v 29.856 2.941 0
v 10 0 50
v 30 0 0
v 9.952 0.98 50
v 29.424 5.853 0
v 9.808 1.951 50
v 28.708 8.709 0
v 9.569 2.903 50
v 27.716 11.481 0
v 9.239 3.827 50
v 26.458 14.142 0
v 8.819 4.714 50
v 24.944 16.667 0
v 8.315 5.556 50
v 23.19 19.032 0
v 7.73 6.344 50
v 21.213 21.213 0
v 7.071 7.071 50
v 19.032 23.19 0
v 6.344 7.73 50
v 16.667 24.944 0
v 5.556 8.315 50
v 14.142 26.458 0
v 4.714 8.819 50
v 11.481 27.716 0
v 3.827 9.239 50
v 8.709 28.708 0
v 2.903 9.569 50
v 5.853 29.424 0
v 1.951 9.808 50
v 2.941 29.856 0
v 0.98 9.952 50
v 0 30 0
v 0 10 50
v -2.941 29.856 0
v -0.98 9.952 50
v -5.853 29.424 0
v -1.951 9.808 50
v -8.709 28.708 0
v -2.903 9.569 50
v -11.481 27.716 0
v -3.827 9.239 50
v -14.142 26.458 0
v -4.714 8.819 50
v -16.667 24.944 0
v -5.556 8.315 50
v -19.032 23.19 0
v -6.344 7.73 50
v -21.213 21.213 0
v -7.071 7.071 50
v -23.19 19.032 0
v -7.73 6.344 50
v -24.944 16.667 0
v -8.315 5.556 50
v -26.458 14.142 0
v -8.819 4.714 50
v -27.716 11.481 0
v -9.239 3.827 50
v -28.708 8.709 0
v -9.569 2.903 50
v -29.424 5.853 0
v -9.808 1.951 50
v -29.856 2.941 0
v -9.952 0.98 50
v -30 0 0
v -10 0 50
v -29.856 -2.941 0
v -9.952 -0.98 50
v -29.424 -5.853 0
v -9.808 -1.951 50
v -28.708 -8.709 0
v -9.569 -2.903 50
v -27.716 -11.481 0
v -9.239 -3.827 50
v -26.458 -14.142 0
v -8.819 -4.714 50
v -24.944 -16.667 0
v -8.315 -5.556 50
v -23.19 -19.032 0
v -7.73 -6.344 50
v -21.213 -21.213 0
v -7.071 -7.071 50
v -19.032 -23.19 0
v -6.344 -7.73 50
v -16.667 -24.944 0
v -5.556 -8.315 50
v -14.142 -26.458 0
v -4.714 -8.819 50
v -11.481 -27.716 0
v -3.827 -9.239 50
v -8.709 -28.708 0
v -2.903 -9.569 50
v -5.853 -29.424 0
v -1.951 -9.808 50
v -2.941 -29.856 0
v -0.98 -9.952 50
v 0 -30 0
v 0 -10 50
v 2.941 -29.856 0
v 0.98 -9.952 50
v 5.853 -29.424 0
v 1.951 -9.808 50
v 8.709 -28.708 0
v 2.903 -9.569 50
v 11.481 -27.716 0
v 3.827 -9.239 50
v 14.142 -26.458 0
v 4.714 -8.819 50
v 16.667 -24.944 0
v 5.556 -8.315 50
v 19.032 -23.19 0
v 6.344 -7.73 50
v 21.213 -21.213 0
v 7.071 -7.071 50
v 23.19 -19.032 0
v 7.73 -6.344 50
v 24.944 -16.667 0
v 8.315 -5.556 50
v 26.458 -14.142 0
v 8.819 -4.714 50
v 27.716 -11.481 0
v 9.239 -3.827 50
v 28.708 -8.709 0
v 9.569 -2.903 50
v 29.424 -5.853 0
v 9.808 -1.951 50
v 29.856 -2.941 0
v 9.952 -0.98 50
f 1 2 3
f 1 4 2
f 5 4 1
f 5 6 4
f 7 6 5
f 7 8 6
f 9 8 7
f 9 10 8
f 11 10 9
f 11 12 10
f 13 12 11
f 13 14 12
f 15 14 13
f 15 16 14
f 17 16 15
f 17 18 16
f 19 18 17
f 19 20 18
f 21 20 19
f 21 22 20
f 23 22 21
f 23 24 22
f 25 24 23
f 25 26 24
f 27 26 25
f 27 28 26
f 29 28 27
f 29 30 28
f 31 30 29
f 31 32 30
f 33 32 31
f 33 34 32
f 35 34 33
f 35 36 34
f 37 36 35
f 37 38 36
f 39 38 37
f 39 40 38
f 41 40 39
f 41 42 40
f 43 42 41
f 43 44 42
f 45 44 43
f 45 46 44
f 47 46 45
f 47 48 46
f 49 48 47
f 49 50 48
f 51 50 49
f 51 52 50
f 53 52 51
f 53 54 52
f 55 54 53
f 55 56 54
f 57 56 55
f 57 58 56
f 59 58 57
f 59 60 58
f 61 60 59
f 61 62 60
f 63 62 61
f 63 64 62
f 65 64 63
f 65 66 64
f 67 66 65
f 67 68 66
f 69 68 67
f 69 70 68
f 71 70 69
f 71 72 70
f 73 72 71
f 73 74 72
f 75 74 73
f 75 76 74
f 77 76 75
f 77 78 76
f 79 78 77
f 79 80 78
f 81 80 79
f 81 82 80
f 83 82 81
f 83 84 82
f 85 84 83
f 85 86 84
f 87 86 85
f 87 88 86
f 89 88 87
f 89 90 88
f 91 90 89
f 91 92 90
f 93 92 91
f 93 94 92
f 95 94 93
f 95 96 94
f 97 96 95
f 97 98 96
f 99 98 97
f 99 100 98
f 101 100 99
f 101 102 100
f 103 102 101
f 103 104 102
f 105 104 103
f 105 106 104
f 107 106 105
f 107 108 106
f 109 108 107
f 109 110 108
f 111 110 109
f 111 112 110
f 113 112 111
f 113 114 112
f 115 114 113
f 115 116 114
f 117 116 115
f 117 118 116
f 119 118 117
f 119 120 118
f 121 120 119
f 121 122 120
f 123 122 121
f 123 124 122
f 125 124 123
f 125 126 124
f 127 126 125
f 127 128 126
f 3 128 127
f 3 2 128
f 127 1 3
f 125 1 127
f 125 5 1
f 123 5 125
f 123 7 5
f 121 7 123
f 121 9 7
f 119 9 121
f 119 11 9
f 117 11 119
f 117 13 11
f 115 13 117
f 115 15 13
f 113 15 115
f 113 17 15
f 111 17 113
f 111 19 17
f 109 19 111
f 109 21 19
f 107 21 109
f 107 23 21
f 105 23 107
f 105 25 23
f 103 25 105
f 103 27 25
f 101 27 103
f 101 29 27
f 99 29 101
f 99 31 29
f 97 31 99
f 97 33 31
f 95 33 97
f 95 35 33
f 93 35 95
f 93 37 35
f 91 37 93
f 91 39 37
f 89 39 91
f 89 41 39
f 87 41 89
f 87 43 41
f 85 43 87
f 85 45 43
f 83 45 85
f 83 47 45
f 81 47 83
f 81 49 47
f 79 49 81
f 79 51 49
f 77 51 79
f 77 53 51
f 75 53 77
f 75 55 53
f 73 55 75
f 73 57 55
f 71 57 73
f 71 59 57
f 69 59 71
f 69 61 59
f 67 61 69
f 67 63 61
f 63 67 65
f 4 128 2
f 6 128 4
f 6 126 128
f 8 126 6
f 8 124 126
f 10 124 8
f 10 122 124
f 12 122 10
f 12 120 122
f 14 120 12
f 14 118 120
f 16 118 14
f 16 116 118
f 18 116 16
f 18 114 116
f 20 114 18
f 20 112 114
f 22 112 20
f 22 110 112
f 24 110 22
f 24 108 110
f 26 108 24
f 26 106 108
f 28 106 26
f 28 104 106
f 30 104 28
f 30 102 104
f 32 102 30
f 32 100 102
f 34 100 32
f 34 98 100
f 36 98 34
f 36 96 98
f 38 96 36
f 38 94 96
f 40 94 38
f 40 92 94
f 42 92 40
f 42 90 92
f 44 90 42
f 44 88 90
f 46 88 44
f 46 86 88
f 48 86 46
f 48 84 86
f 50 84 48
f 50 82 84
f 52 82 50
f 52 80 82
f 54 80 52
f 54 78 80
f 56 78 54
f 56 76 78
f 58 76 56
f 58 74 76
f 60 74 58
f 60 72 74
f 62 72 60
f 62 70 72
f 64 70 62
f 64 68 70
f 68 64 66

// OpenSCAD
// Cone / frustum generator
/****************************
 * User parameters
 ****************************/
r1 = 30;   // bottom radius
r2 = 10;   // top radius (0 for cone)
height = 50;
center_cone = false;
$fn = 64;

/****************************
 * Assembly
 ****************************/
module cone_generator() {
    cylinder(h=height, r1=r1, r2=r2, center=center_cone);
}

cone_generator();
